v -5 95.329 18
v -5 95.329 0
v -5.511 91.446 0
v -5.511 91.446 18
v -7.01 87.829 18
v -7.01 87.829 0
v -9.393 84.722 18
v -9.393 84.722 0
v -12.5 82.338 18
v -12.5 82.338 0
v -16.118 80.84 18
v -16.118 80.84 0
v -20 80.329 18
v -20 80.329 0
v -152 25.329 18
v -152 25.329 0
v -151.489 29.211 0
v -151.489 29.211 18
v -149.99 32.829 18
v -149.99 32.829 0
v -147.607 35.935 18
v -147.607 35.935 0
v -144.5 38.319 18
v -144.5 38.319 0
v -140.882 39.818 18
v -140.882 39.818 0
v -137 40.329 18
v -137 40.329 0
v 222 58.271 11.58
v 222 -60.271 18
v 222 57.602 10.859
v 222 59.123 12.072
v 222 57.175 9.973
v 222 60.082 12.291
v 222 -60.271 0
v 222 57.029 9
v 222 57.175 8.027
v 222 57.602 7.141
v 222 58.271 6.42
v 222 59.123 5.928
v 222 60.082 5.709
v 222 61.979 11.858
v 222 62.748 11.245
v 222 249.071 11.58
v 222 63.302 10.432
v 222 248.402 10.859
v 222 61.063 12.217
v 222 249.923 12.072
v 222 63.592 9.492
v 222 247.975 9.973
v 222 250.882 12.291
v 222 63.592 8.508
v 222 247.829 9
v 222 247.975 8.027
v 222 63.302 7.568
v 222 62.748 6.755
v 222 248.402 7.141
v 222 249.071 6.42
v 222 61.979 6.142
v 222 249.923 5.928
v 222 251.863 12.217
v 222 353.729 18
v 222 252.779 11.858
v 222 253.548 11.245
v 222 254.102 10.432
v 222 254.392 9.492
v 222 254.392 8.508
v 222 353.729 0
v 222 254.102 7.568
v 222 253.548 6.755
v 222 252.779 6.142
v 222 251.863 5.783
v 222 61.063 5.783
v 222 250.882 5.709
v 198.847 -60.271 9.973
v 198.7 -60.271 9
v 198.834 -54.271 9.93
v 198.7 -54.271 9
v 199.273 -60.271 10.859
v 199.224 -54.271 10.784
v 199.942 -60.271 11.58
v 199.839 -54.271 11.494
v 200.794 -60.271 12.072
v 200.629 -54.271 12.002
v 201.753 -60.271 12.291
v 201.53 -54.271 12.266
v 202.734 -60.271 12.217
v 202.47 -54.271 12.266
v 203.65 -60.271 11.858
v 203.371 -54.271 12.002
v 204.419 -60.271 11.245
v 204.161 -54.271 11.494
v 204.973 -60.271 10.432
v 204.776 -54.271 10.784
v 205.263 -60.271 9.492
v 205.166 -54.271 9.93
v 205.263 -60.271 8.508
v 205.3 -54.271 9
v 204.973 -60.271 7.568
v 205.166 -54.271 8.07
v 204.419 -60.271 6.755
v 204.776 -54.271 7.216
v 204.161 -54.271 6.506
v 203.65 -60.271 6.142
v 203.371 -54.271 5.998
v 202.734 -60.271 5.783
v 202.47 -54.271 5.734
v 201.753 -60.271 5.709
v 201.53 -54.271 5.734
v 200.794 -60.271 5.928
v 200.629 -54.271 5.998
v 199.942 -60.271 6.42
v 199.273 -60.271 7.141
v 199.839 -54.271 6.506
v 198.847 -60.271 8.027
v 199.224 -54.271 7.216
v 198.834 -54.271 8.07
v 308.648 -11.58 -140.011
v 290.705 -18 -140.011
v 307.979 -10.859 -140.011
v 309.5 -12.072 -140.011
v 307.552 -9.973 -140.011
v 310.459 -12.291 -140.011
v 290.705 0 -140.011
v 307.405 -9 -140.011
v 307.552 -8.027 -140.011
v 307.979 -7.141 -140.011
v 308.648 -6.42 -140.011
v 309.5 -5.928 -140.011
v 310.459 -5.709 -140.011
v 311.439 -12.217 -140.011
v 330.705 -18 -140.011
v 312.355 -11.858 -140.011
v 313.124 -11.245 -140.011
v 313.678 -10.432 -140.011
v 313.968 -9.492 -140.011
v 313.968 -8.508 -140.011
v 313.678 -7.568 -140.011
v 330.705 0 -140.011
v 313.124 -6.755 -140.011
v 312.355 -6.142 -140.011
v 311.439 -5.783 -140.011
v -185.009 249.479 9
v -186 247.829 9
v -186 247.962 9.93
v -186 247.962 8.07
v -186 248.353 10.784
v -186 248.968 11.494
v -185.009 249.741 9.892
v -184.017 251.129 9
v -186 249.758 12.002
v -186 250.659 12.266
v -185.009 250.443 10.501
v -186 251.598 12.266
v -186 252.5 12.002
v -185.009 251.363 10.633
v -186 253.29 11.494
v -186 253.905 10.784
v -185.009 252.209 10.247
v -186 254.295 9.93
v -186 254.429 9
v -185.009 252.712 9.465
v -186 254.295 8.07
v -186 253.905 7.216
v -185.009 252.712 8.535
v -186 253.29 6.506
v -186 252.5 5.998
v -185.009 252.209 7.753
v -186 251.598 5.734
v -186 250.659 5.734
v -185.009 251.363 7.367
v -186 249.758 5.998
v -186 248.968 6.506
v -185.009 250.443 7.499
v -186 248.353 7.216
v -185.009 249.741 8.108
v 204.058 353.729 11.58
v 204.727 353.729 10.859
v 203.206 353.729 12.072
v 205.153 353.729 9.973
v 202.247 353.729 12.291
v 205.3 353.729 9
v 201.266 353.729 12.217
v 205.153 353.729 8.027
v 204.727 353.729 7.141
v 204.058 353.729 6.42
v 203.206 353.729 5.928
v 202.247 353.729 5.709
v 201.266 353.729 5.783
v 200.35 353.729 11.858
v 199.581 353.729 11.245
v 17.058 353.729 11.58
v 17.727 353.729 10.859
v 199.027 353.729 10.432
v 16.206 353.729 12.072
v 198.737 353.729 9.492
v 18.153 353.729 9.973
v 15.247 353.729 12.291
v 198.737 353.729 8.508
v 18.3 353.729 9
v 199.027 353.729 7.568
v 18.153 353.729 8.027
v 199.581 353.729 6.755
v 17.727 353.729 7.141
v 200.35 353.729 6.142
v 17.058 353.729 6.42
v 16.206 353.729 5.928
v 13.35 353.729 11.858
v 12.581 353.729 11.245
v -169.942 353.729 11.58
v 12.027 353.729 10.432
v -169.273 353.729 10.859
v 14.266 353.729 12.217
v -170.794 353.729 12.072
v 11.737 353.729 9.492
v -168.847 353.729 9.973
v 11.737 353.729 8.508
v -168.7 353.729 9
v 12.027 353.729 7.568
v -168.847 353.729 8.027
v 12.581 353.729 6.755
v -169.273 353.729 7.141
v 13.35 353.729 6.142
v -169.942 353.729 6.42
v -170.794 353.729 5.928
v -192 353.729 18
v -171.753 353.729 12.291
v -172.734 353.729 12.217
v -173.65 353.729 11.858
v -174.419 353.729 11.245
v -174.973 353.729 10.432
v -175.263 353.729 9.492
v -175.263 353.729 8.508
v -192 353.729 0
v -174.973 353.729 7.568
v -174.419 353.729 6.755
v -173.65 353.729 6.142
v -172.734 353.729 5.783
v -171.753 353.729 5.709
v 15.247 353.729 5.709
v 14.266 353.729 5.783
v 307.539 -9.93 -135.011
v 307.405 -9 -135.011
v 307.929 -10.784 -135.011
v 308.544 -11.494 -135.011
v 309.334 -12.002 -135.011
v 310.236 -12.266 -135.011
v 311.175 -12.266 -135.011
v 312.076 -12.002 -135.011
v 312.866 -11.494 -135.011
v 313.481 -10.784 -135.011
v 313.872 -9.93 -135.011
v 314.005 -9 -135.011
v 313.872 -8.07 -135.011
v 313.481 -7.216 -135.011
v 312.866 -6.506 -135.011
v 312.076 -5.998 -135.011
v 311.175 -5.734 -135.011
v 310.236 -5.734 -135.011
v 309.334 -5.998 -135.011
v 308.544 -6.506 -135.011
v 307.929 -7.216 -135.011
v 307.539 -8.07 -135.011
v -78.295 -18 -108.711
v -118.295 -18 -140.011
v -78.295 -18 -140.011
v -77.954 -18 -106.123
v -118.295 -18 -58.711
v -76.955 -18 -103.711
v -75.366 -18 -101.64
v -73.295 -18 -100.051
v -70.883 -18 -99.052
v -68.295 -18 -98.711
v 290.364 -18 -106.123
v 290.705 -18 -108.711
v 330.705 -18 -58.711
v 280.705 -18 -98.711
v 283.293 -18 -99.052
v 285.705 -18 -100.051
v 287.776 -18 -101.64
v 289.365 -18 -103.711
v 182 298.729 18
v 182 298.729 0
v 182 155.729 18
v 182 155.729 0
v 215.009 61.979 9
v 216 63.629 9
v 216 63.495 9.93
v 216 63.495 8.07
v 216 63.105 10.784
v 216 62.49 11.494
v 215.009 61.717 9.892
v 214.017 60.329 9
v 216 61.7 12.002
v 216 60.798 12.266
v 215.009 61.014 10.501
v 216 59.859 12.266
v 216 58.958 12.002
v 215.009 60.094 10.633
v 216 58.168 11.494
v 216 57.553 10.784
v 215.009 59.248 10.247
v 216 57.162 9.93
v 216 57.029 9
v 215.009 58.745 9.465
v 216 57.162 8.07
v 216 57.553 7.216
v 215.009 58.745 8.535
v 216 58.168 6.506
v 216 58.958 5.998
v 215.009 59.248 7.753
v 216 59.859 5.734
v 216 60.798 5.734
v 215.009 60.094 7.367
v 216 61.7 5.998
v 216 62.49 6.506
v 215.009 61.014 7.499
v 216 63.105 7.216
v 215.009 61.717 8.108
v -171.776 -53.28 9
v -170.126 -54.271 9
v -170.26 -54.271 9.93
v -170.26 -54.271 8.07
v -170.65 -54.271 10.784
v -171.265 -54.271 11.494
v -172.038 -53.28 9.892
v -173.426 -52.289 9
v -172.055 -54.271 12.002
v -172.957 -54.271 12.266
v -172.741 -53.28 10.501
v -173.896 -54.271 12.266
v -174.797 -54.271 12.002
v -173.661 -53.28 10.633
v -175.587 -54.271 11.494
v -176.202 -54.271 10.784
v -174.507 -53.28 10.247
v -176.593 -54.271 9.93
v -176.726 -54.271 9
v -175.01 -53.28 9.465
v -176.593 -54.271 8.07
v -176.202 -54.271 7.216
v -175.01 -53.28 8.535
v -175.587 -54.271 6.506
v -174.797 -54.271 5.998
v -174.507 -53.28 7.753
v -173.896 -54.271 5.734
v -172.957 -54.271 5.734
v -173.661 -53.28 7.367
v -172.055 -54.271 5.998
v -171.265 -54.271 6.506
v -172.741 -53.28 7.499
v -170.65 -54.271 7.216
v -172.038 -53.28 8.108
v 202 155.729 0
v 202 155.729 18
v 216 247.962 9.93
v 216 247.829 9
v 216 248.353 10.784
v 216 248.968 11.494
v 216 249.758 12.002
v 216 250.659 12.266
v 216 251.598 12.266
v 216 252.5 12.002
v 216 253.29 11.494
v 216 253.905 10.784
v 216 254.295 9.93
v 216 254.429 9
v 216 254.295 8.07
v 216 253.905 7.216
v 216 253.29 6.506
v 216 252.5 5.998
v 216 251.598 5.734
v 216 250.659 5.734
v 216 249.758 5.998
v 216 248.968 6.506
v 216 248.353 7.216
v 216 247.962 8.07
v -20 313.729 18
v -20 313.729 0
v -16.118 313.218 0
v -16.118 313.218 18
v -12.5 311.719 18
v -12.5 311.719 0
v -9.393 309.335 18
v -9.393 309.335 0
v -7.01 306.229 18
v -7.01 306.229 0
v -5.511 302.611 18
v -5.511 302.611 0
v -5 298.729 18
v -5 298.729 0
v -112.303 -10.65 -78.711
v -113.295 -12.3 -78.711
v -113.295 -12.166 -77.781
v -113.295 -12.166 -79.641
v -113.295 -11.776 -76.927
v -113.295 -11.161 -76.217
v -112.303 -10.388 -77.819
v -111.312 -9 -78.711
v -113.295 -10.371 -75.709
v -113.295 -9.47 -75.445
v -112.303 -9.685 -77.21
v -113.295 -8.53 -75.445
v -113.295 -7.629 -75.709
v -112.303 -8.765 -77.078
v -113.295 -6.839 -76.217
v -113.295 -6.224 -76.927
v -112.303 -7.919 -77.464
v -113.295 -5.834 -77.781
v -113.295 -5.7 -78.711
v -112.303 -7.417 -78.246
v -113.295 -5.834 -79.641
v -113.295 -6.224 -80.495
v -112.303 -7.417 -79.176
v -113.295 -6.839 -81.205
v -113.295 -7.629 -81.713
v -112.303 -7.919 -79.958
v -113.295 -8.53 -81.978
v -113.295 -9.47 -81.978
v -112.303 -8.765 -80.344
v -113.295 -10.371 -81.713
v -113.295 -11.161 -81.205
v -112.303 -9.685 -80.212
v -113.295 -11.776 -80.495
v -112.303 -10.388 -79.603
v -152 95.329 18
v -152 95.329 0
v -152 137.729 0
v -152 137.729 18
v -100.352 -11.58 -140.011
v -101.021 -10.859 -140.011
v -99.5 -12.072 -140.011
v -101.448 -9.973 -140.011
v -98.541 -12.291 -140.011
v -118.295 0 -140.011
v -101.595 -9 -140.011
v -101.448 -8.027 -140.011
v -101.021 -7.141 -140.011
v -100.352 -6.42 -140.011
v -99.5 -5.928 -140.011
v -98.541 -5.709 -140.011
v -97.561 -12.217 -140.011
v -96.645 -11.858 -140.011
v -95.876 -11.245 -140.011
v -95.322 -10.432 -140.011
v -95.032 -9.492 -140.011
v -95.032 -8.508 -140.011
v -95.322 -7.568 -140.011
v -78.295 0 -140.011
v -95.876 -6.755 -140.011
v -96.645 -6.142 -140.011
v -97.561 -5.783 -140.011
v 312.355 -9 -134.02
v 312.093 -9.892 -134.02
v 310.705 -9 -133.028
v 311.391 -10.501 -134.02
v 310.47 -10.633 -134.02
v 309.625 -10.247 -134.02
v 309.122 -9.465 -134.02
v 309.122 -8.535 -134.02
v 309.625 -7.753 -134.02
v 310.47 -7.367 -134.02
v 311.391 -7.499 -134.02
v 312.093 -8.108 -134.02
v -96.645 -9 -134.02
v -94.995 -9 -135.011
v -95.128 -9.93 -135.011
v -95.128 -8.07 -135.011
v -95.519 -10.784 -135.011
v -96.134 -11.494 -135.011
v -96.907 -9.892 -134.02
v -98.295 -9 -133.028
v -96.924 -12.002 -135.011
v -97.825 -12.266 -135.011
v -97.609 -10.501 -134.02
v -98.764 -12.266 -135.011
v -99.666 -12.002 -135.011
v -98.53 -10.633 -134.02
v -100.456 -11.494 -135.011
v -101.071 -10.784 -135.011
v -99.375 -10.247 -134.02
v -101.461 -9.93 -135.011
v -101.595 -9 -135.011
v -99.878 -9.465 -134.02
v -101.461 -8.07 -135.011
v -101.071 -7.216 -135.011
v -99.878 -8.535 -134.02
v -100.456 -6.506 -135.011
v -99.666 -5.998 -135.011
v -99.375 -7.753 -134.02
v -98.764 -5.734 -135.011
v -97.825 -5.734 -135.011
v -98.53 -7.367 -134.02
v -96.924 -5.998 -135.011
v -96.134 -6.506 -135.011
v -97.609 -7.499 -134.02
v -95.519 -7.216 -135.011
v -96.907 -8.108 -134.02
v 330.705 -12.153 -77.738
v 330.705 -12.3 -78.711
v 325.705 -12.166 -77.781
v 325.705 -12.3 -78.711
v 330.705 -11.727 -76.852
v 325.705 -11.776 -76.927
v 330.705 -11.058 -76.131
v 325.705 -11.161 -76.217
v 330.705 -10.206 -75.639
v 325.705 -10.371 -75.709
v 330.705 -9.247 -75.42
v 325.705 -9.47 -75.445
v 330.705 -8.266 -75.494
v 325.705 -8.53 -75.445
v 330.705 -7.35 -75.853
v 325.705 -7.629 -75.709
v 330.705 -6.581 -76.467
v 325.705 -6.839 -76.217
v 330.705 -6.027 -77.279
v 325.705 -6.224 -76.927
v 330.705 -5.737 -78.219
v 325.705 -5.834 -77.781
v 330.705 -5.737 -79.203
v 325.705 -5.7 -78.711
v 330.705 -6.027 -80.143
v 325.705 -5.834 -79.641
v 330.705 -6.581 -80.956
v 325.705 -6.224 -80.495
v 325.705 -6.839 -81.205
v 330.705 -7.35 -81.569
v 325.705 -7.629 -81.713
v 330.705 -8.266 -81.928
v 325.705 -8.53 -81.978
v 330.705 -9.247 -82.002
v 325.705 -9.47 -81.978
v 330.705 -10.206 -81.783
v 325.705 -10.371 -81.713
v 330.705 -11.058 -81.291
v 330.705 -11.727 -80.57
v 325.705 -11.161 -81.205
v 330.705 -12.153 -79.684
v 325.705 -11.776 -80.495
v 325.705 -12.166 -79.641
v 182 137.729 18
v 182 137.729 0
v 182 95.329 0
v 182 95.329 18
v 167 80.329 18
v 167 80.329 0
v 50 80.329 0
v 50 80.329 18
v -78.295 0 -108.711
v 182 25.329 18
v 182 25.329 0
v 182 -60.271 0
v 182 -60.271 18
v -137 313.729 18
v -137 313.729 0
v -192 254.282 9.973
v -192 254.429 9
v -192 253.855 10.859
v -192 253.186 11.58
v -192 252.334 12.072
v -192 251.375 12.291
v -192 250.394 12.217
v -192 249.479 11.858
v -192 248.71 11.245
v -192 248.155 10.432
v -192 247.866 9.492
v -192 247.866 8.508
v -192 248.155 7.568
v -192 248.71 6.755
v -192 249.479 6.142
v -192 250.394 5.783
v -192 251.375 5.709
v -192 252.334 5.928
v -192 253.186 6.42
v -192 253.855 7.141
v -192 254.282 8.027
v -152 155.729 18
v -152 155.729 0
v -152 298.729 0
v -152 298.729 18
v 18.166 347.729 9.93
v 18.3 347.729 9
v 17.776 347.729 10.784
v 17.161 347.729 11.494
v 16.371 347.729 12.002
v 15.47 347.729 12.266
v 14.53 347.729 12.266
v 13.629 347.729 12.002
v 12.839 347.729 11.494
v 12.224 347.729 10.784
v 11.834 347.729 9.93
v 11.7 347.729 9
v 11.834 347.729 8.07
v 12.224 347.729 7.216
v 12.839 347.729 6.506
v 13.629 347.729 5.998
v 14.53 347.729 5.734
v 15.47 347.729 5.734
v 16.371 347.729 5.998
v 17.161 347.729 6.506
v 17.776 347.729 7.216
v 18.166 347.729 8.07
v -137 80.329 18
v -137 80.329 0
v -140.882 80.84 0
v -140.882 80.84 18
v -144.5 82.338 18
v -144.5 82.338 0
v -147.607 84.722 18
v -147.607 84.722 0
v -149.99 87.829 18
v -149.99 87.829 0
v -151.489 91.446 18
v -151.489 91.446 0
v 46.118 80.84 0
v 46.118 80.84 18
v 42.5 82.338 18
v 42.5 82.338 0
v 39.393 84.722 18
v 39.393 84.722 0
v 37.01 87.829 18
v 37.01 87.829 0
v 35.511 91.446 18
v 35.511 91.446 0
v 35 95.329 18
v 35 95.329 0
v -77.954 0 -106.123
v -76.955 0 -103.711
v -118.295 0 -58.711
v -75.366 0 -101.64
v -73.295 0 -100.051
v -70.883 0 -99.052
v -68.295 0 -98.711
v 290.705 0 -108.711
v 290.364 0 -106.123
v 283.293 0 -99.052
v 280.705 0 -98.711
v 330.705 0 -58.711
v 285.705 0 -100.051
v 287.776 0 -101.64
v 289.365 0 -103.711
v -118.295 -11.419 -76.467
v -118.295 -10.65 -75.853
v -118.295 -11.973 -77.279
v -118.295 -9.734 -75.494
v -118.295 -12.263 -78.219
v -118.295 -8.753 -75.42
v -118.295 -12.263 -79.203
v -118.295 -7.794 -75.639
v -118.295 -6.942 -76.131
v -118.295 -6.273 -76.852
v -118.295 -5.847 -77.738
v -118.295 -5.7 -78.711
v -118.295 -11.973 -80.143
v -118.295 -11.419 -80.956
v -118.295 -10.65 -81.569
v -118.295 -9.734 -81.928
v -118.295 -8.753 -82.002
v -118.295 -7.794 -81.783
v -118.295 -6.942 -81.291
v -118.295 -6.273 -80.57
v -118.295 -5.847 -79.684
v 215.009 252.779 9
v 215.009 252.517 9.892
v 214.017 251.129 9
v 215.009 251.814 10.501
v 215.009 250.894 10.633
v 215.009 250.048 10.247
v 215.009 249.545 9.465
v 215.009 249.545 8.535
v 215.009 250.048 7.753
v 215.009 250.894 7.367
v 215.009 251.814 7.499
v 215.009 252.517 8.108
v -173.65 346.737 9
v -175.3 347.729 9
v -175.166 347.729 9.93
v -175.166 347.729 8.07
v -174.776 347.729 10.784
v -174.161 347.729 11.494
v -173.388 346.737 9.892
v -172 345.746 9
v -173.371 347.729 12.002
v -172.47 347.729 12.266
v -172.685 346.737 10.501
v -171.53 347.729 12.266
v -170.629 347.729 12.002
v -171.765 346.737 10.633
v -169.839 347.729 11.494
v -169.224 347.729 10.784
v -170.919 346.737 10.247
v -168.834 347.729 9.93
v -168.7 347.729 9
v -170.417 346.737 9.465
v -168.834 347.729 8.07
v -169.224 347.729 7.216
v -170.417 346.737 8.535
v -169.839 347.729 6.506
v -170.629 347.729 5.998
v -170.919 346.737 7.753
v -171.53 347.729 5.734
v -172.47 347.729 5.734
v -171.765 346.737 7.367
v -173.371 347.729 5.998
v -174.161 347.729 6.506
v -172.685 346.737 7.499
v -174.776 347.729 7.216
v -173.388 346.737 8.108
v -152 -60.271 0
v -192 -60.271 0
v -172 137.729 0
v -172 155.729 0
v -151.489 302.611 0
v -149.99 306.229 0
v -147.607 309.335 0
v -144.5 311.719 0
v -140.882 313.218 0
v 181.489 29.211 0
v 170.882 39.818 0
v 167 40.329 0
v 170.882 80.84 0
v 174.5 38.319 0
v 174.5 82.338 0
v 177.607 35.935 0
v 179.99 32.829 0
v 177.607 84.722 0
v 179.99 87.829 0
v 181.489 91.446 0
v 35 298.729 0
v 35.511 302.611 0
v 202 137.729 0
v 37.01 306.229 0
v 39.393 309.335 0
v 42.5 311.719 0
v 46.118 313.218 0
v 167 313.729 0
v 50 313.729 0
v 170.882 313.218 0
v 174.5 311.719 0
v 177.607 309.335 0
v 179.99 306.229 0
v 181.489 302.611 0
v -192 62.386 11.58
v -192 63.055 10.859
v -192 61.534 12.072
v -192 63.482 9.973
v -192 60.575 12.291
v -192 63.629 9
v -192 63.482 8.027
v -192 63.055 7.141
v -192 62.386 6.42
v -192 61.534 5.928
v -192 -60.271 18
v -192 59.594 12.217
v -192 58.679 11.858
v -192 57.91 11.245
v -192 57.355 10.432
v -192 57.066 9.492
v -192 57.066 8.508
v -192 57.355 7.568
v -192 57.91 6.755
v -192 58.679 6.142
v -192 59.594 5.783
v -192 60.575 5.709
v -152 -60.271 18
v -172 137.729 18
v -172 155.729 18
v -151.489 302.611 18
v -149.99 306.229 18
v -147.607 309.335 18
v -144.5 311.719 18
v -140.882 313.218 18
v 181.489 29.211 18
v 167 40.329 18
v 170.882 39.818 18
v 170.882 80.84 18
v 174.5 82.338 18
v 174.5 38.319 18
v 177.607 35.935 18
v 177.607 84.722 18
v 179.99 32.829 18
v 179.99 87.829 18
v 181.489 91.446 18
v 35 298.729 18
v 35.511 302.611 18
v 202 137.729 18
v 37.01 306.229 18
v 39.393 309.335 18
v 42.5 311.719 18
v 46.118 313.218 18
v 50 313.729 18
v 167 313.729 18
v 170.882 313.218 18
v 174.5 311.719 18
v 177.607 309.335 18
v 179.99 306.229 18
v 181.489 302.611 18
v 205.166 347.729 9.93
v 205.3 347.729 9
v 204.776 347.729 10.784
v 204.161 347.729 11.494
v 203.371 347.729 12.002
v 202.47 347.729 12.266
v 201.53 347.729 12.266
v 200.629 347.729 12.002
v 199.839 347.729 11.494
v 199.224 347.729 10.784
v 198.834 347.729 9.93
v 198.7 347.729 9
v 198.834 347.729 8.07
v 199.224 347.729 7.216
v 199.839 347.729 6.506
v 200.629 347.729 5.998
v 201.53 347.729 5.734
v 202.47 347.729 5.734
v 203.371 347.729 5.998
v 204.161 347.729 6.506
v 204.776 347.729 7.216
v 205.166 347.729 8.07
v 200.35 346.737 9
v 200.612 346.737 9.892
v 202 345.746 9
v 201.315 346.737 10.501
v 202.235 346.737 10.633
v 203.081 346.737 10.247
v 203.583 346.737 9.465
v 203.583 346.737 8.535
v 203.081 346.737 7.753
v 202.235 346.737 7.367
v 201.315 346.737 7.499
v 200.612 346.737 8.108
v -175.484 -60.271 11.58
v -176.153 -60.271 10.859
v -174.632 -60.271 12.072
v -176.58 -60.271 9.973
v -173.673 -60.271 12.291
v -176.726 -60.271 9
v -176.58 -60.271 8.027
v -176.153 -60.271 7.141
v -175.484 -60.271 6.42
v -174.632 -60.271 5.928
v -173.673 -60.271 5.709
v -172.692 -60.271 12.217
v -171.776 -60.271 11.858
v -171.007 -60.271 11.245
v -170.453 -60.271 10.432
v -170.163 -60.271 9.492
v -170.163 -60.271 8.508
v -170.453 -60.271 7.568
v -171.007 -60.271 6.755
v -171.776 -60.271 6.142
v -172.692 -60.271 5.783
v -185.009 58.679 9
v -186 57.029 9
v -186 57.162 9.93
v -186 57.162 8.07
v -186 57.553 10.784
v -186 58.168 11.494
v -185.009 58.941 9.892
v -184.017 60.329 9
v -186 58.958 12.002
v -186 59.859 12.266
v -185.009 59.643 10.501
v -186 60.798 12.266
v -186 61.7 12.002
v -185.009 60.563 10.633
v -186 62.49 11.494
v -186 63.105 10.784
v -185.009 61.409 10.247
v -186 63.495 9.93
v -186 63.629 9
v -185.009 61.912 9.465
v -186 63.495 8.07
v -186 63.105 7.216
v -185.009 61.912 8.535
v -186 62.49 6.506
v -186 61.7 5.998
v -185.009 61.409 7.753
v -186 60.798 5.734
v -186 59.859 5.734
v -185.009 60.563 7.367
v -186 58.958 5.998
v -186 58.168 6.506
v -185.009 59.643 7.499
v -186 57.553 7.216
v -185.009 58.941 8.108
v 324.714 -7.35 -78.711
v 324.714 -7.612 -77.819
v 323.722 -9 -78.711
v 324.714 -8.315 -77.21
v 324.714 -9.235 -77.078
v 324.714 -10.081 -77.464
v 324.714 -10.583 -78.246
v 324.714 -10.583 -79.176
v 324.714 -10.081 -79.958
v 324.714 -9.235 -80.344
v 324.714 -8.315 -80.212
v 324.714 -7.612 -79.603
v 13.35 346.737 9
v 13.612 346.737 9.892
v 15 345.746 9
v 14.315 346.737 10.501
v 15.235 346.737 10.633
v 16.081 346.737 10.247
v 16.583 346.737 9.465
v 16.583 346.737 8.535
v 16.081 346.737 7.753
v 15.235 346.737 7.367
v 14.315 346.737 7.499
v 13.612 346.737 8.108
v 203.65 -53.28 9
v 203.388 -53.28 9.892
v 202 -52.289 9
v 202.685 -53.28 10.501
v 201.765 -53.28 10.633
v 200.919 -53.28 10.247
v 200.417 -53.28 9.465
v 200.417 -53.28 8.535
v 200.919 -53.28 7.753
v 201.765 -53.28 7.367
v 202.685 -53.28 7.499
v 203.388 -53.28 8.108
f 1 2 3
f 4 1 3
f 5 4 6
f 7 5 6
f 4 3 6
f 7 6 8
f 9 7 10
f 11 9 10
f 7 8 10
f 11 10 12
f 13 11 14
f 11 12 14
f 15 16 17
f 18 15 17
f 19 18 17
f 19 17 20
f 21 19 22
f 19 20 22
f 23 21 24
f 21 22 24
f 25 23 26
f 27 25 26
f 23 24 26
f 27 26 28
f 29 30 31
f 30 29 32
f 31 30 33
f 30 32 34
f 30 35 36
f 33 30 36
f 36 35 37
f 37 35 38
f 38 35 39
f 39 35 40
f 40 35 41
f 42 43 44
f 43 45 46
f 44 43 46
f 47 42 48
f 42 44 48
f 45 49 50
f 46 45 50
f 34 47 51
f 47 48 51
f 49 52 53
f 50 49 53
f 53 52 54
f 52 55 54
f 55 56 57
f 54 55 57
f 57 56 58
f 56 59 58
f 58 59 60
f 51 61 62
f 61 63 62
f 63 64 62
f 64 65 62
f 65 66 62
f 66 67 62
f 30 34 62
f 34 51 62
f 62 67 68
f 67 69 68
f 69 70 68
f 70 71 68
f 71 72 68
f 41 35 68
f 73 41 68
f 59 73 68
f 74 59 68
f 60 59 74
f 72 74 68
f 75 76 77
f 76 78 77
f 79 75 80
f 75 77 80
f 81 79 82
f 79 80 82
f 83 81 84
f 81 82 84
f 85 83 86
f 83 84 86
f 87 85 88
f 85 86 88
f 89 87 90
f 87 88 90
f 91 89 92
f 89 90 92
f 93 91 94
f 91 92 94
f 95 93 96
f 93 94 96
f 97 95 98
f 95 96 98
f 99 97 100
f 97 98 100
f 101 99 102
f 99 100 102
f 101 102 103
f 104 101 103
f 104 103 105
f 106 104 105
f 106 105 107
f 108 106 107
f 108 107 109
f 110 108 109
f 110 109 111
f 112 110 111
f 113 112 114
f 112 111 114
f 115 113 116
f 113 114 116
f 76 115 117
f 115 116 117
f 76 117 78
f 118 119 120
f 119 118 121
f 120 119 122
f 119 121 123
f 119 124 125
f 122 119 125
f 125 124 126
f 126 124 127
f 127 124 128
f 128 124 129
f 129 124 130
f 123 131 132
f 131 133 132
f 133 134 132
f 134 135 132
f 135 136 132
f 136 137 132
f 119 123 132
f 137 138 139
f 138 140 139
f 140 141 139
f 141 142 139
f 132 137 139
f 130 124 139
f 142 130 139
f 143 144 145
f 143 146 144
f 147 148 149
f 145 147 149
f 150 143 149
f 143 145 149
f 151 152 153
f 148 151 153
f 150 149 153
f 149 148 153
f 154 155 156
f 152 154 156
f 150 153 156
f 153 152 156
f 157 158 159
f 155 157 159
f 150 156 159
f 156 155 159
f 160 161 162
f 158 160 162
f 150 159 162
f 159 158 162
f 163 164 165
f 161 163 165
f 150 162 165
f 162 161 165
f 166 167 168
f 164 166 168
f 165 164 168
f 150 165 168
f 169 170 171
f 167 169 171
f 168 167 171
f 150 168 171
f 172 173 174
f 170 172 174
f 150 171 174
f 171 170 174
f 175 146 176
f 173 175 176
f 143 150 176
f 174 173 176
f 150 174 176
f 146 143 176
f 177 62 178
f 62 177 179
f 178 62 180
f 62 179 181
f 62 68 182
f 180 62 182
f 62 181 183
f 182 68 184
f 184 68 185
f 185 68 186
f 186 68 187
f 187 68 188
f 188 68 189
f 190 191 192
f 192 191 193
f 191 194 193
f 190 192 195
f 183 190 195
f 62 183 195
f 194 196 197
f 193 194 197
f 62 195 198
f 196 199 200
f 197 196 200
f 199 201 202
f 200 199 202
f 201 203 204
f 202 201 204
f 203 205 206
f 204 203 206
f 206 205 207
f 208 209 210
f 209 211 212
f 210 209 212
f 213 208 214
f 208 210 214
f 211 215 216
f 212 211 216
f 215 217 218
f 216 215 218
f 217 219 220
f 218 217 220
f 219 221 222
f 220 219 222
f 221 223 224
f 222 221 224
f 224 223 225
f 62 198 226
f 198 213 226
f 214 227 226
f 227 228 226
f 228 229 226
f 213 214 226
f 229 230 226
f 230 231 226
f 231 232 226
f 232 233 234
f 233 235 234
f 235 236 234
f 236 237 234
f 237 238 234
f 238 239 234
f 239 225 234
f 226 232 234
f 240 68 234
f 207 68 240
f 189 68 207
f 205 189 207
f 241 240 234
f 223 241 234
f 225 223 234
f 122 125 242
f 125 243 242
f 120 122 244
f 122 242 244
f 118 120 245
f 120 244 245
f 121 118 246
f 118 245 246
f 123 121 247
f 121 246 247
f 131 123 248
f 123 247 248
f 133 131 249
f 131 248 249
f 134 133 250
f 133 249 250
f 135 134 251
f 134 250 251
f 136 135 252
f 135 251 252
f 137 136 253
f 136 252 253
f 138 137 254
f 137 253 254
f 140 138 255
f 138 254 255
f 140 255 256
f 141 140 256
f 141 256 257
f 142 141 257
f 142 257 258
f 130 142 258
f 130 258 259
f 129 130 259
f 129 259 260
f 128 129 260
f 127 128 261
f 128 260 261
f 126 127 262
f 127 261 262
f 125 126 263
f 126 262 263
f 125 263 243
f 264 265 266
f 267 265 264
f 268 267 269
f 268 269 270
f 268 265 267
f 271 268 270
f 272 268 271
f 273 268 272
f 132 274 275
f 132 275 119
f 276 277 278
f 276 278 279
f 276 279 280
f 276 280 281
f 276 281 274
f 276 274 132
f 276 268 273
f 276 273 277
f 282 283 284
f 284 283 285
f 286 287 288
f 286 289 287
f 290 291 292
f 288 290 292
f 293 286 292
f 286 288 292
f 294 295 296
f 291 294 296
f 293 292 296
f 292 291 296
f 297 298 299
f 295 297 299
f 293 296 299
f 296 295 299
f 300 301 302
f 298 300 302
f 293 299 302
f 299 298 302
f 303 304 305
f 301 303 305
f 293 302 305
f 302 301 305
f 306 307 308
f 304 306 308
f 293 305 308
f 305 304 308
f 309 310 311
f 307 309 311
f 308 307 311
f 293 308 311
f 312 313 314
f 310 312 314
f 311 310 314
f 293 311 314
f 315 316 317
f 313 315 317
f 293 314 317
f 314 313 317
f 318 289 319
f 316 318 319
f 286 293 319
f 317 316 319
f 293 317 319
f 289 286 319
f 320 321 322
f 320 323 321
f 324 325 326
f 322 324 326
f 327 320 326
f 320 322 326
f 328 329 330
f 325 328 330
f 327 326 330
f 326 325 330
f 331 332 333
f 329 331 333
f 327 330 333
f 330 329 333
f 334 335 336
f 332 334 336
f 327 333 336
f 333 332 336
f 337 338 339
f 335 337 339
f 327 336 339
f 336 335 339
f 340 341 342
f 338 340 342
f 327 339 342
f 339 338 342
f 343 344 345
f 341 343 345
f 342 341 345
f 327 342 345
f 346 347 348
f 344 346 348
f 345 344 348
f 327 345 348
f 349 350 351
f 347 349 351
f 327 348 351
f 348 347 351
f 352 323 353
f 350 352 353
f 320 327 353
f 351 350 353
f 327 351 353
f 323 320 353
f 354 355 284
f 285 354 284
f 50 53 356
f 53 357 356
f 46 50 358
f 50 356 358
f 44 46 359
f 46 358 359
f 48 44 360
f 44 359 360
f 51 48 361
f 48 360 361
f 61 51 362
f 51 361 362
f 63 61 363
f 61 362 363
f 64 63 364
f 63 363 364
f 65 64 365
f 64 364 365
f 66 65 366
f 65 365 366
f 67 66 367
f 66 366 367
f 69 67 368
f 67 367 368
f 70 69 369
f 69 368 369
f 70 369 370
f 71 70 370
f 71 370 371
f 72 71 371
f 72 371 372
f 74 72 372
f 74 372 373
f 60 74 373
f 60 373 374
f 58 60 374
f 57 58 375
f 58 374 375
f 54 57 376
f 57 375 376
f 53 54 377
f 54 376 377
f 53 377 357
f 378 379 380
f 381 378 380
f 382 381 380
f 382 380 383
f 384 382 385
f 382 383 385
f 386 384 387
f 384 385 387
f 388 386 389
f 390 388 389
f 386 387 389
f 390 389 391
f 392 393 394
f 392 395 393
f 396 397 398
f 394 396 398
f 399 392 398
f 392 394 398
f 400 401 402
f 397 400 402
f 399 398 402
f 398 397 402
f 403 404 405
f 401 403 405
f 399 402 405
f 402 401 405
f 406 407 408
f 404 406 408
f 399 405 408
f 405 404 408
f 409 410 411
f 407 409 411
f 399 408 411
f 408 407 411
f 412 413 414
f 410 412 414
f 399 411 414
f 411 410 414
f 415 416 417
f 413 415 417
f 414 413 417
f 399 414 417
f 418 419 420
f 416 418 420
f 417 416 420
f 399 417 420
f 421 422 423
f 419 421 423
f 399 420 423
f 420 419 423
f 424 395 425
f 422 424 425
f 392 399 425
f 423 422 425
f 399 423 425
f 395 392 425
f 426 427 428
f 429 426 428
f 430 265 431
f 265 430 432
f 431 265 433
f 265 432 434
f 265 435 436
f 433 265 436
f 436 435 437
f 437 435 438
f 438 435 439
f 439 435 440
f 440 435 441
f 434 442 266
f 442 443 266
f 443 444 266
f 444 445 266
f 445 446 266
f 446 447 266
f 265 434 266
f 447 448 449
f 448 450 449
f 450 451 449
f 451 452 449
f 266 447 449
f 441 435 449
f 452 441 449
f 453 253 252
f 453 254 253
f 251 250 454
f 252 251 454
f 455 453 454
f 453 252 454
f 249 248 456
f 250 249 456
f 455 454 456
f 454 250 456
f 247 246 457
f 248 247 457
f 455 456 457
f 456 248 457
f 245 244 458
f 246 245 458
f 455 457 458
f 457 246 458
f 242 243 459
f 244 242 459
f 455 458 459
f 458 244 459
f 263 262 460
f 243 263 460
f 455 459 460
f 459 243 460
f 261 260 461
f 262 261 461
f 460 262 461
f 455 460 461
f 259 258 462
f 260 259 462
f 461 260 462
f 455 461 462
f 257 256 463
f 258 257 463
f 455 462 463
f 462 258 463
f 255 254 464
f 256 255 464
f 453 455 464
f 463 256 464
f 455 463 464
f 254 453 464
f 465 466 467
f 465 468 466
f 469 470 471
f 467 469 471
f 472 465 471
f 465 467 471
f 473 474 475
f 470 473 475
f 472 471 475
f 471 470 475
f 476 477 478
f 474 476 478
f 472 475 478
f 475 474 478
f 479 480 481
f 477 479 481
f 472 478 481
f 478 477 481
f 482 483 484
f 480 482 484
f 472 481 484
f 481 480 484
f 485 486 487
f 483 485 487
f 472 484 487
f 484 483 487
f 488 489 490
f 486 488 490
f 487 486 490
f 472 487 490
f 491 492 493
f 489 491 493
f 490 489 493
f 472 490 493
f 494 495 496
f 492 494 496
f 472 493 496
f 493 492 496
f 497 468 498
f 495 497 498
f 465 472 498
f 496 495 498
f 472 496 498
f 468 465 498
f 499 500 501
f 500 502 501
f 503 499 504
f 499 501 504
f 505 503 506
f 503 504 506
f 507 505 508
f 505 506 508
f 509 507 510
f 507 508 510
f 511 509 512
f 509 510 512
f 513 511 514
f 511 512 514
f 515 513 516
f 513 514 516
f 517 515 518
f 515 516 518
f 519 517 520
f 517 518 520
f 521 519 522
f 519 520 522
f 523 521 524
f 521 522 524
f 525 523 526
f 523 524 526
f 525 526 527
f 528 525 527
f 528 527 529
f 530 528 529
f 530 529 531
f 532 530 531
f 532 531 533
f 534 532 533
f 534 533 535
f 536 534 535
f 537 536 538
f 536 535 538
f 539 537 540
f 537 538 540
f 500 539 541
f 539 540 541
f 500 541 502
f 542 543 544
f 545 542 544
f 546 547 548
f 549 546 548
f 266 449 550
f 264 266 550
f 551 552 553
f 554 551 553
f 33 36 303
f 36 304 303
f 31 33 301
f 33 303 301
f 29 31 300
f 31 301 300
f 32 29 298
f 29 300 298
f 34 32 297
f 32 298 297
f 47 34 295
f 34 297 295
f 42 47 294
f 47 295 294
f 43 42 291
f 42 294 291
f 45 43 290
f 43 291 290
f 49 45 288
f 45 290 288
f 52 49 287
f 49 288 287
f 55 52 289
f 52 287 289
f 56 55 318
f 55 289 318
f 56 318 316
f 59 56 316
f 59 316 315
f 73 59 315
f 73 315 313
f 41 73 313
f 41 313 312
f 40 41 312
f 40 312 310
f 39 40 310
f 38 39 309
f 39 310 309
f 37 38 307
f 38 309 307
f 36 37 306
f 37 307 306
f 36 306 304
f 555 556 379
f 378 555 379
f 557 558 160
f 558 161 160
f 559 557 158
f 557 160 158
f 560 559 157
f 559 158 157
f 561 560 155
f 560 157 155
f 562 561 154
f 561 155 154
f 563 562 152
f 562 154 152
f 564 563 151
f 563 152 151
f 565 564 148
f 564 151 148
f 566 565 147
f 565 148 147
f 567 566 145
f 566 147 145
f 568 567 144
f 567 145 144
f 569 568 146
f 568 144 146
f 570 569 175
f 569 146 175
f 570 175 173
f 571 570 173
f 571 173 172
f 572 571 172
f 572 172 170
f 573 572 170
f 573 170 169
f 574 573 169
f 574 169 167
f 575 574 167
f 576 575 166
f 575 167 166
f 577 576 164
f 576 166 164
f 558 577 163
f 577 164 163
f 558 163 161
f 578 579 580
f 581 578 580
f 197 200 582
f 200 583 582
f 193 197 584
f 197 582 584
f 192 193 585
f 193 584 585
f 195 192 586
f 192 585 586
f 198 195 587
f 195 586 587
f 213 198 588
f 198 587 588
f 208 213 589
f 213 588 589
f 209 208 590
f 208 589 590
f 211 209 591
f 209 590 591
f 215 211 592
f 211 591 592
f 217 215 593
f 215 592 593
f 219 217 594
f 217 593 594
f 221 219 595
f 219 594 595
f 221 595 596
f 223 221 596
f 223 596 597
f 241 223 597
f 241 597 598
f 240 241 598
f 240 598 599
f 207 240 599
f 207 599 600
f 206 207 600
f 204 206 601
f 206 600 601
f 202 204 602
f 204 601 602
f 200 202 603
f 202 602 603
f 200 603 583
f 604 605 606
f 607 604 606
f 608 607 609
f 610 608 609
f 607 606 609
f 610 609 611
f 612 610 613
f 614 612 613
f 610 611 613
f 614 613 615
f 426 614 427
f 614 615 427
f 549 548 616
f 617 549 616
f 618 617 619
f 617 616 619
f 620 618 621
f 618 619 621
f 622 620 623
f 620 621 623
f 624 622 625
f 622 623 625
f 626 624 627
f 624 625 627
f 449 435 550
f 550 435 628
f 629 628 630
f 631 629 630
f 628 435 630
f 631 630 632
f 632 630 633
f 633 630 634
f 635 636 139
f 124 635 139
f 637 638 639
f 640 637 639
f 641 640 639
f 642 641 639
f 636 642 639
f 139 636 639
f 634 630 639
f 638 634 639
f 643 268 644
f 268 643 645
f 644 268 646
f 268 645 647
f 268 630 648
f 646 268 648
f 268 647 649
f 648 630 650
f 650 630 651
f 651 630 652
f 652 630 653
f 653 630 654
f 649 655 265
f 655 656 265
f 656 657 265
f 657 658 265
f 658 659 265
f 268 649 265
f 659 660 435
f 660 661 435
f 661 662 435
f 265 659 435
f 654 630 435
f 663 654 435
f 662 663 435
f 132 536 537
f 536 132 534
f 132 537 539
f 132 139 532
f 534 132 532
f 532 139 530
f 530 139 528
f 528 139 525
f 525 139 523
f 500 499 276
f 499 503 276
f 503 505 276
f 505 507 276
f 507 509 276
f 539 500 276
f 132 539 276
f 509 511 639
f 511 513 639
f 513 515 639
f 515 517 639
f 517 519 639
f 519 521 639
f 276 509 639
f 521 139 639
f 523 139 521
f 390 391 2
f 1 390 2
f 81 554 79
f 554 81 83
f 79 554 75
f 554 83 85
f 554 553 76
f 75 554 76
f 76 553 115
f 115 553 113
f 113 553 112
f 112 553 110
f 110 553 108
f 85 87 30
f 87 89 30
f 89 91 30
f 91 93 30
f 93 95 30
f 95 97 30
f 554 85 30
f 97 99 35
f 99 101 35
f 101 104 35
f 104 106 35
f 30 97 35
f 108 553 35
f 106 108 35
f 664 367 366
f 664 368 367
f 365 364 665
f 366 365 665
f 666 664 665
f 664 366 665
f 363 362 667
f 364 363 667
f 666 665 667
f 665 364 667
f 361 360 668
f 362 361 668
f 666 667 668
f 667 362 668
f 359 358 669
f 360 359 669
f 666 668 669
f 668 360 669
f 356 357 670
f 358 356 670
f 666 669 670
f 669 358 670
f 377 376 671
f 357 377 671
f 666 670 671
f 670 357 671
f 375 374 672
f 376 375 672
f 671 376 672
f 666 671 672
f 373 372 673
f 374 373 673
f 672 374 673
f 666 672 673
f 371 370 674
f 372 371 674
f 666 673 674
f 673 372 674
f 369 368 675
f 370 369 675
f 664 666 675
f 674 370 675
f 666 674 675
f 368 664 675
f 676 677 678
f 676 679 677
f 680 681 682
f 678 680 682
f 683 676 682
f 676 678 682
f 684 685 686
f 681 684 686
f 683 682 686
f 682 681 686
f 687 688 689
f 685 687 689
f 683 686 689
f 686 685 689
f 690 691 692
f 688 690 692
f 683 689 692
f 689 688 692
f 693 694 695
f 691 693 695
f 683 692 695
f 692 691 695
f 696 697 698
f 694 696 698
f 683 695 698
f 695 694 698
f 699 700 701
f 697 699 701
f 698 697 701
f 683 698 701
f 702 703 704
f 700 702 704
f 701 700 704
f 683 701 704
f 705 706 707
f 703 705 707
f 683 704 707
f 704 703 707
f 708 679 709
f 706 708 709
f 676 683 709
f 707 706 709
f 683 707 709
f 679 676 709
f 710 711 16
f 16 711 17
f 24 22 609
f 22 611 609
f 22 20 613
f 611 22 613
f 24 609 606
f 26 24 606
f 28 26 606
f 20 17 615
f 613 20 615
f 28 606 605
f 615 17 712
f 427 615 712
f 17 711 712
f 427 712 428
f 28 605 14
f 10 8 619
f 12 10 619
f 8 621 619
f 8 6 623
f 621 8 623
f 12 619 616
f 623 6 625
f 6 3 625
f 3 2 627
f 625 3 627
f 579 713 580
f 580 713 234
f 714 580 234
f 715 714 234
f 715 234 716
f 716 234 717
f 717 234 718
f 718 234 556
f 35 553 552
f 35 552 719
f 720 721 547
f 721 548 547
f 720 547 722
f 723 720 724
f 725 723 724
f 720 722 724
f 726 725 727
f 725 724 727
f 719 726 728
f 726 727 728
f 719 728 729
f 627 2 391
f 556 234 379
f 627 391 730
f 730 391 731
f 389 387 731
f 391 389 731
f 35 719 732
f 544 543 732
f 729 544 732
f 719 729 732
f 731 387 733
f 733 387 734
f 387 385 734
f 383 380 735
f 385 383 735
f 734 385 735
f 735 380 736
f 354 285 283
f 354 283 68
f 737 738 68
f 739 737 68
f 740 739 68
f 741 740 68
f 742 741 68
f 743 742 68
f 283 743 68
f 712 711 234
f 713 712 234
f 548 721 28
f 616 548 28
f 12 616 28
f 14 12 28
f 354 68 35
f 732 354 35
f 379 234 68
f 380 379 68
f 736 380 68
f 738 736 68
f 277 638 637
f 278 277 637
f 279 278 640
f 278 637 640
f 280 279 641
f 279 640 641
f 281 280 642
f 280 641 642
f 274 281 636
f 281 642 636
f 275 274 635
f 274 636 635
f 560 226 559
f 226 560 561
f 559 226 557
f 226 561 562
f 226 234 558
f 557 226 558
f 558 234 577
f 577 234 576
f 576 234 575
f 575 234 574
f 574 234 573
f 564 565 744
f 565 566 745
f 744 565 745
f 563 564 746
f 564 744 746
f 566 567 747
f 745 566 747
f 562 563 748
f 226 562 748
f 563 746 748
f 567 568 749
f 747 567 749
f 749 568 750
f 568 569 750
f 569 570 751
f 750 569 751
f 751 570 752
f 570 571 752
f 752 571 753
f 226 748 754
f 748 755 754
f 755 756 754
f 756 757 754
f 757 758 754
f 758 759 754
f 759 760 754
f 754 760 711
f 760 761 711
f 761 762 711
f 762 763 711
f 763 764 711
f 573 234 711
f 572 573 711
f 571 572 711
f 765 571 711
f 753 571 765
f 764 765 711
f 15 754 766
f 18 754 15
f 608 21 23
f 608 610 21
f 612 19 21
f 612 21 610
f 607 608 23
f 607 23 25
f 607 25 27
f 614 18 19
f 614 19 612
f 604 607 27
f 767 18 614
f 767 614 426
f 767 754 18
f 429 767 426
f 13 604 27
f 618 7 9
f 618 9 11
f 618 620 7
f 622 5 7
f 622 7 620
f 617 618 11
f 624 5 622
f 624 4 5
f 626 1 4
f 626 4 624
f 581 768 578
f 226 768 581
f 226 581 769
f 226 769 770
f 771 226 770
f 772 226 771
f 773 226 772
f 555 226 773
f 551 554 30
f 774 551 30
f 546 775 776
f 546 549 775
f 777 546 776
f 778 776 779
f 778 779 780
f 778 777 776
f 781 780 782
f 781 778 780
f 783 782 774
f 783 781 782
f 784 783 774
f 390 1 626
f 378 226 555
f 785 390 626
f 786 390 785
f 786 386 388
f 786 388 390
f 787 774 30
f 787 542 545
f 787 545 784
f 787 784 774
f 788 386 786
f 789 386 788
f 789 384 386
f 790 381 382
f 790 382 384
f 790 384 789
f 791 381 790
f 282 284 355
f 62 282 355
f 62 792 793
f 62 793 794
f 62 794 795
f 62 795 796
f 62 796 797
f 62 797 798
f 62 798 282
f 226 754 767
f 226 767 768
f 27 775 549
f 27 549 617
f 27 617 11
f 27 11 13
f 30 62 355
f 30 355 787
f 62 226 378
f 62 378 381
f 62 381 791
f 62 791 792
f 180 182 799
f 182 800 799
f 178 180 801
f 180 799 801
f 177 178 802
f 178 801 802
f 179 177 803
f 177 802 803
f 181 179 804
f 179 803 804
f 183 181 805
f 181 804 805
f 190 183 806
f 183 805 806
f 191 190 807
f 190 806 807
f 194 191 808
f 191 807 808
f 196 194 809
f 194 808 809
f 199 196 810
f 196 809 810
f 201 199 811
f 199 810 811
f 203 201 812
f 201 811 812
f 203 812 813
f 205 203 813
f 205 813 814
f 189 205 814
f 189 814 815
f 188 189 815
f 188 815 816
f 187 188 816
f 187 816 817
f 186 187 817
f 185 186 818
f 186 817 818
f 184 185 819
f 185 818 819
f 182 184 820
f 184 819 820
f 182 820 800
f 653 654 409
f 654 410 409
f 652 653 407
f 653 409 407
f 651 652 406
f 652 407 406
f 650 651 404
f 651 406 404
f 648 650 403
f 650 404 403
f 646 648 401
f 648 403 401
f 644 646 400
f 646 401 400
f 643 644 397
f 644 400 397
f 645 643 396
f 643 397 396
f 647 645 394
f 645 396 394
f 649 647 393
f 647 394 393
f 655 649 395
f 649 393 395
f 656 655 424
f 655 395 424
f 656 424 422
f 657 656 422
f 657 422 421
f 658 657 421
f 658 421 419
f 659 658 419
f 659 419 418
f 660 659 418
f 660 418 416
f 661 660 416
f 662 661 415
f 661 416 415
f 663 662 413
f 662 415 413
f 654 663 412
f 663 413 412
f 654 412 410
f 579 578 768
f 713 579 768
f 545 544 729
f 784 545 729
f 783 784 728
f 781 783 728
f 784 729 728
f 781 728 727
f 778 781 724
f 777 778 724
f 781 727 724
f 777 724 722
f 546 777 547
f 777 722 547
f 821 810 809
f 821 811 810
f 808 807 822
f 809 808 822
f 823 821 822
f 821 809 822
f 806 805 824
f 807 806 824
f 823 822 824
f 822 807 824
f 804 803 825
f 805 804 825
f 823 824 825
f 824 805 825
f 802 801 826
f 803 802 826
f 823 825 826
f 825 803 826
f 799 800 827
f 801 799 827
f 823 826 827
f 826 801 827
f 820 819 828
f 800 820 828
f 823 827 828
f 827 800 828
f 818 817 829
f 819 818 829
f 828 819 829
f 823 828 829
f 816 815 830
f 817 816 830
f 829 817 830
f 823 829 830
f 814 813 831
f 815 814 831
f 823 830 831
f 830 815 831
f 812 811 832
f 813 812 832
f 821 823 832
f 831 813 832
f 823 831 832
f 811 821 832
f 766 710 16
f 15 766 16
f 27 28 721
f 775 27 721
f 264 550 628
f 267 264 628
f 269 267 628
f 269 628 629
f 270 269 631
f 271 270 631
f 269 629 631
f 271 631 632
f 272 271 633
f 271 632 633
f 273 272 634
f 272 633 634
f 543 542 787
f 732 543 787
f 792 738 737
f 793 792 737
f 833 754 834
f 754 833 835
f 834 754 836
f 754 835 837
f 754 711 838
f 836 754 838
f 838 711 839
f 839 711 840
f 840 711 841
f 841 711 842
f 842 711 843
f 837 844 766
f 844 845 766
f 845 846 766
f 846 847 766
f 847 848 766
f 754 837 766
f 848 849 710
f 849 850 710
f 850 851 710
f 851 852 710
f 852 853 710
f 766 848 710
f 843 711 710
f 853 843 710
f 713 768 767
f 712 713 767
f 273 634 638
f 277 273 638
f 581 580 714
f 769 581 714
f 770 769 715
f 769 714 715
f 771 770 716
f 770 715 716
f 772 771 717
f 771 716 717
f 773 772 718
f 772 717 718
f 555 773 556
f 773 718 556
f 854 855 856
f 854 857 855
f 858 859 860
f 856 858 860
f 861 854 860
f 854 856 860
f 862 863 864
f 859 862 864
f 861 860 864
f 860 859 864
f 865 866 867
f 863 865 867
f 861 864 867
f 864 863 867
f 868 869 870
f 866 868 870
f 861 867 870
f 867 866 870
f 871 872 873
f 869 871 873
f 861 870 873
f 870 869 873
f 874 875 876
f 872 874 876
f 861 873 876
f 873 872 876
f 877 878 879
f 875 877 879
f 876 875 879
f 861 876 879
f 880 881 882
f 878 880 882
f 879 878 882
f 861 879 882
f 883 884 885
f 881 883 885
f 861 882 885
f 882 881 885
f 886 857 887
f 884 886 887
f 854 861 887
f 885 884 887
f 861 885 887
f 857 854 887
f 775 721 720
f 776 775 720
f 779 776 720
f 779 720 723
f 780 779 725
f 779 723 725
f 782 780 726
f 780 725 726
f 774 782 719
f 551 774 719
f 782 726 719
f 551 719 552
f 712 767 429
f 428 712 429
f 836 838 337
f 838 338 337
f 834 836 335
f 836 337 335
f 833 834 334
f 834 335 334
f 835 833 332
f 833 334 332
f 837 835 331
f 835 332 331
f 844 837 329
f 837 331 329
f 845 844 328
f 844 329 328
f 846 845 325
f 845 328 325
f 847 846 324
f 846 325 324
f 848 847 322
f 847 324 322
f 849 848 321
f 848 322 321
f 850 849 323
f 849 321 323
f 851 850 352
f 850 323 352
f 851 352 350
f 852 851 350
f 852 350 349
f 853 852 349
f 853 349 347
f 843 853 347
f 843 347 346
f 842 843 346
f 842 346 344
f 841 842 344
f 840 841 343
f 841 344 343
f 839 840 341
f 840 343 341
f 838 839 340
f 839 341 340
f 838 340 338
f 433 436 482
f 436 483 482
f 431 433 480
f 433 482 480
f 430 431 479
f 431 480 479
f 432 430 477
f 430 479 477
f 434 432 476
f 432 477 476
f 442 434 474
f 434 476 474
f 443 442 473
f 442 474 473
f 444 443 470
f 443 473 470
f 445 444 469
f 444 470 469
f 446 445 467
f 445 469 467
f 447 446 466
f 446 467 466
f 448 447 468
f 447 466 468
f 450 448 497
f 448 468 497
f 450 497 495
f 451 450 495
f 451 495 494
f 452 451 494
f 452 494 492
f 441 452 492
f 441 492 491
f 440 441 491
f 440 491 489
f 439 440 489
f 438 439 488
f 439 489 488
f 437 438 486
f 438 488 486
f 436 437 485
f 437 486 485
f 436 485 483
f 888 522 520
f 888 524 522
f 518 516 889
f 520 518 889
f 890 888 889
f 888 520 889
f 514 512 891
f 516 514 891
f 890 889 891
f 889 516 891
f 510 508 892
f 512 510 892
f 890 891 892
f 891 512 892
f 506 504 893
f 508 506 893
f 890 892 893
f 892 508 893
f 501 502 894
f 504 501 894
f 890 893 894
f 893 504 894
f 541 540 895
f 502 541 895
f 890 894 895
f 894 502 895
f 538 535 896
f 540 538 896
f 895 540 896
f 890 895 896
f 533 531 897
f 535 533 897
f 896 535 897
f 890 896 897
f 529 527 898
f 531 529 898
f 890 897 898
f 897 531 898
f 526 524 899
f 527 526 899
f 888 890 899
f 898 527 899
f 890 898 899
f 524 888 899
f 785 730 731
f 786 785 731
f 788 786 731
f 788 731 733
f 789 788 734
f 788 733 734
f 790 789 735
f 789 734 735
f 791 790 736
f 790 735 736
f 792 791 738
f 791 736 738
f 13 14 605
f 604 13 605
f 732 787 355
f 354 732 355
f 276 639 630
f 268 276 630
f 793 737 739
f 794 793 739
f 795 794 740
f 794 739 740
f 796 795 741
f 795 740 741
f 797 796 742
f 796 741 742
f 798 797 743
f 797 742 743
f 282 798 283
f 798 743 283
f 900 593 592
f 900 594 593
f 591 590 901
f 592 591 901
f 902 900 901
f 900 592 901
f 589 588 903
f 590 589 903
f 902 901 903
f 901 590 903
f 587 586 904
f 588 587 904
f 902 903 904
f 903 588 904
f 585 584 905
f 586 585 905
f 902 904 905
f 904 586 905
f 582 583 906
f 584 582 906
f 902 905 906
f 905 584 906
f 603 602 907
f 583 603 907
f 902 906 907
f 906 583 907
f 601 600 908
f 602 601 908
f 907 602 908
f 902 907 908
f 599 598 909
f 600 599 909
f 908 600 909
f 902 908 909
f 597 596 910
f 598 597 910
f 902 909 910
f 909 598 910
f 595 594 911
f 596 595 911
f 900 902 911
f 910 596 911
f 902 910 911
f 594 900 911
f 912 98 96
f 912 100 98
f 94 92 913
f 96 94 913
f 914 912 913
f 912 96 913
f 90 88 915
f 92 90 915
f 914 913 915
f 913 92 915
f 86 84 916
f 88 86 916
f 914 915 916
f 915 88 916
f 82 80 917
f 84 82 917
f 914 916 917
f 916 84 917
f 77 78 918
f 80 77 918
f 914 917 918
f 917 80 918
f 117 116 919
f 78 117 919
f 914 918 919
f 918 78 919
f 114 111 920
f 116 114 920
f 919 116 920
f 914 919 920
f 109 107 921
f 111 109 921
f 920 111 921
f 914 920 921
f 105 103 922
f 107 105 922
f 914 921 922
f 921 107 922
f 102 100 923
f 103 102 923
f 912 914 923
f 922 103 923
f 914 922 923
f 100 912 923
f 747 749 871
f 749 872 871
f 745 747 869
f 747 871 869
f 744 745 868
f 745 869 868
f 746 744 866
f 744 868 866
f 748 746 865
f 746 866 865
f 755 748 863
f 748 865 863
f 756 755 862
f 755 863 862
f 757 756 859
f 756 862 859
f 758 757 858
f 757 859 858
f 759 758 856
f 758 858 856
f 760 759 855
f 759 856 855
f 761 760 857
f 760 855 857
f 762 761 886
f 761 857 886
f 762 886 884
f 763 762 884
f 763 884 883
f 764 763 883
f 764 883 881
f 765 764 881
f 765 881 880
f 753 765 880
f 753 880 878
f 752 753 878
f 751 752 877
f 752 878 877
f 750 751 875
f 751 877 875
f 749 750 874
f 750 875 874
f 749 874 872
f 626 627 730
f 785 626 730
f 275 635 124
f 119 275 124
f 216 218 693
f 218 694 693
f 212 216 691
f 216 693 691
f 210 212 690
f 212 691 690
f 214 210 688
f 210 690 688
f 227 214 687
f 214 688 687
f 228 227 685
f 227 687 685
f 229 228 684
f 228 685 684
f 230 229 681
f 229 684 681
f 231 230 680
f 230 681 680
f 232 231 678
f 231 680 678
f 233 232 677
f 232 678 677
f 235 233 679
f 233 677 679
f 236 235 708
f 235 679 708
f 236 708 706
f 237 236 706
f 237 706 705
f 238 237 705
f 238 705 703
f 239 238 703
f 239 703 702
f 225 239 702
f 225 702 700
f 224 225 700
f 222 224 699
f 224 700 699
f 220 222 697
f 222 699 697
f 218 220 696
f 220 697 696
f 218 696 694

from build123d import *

# Parameters (mm, degrees)
F1_DEPTH         = 18
F6_D             = 6.6
F6_DEPTH         = 6
F6_TIP           = 1.9828400428
F6_ON_F5_D       = 6.6
F6_ON_F5_DEPTH   = 6
F6_ON_F5_TIP     = 1.9828400428
F6_ON_F2_D       = 6.6
F6_ON_F2_DEPTH   = 6
F6_ON_F2_TIP     = 1.9828400428
F6_ON_F4_D       = 6.6
F6_ON_F4_DEPTH   = 6
F6_ON_F4_TIP     = 1.9828400428
F7_ANGLE         = 90
F8_ANGLE         = -90
F10_DEPTH        = 18
F12_DEPTH        = 18
F17_D            = 6.6
F17_DEPTH        = 5
F17_TIP          = 1.9828400428
F17_ON_F15_D     = 6.6
F17_ON_F15_DEPTH = 5
F17_ON_F15_TIP   = 1.9828400428
F17_ON_F16_D     = 6.6
F17_ON_F16_DEPTH = 5
F17_ON_F16_TIP   = 1.9828400428
F17_ON_F14_D     = 6.6
F17_ON_F14_DEPTH = 5
F17_ON_F14_TIP   = 1.9828400428


with BuildPart() as f1:
    # F0 (on Top) → F1 (new body)
    with BuildSketch(Plane.XY):
        with BuildLine():
            Line((15, 353.7286525786), (-192, 353.7286525786))
            Line((-192, 353.7286525786), (-192, -60.2713474214))
            Line((-192, -60.2713474214), (-152, -60.2713474214))
            Line((-152, -60.2713474214), (-152, 25.3286525786))
            ThreePointArc((-152, 25.3286525786), (-147.6066017178, 35.9352542964), (-137, 40.3286525786))
            Line((-137, 40.3286525786), (15, 40.3286525786))
            Line((15, 40.3286525786), (15, 353.7286525786))
        make_face()
        with BuildLine():
            ThreePointArc((-20, 313.7286525786), (-9.3933982822, 309.3352542964), (-5, 298.7286525786))
            Line((-5, 298.7286525786), (-5, 95.3286525786))
            ThreePointArc((-5, 95.3286525786), (-9.3933982822, 84.7220508608), (-20, 80.3286525786))
            Line((-20, 80.3286525786), (-137, 80.3286525786))
            ThreePointArc((-137, 80.3286525786), (-147.6066017178, 84.7220508608), (-152, 95.3286525786))
            Line((-152, 95.3286525786), (-152, 298.7286525786))
            ThreePointArc((-152, 298.7286525786), (-147.6066017178, 309.3352542964), (-137, 313.7286525786))
            Line((-137, 313.7286525786), (-20, 313.7286525786))
        make_face(mode=Mode.SUBTRACT)
        with BuildLine():
            Line((222, 353.7286525786), (15, 353.7286525786))
            Line((15, 353.7286525786), (15, 40.3286525786))
            Line((15, 40.3286525786), (167, 40.3286525786))
            ThreePointArc((167, 40.3286525786), (177.6066017178, 35.9352542964), (182, 25.3286525786))
            Line((182, 25.3286525786), (182, -60.2713474214))
            Line((182, -60.2713474214), (222, -60.2713474214))
            Line((222, -60.2713474214), (222, 353.7286525786))
        make_face()
        with BuildLine():
            ThreePointArc((35, 298.7286525786), (39.3933982822, 309.3352542964), (50, 313.7286525786))
            Line((50, 313.7286525786), (167, 313.7286525786))
            ThreePointArc((167, 313.7286525786), (177.6066017178, 309.3352542964), (182, 298.7286525786))
            Line((182, 298.7286525786), (182, 95.3286525786))
            ThreePointArc((182, 95.3286525786), (177.6066017178, 84.7220508608), (167, 80.3286525786))
            Line((167, 80.3286525786), (50, 80.3286525786))
            ThreePointArc((50, 80.3286525786), (39.3933982822, 84.7220508608), (35, 95.3286525786))
            Line((35, 95.3286525786), (35, 298.7286525786))
        make_face(mode=Mode.SUBTRACT)
    extrude(amount=F1_DEPTH)

    # F6
    with Locations(Plane.XZ.offset(60.2713474214)):
        with Locations((202, 9), (-173.4263598919, 9)):
            Hole(F6_D / 2, depth=F6_DEPTH)
            with Locations((0, 0, -(F6_DEPTH + F6_TIP / 2))):  # 118° drill point
                Cone(0, F6_D / 2, F6_TIP, mode=Mode.SUBTRACT)

    # F6 on F5
    with Locations(Plane(origin=(-192, 0, 0), x_dir=(0, -1, 0), z_dir=(-1, 0, 0))):
        with Locations((-60.3286525786, 9), (-251.1286525786, 9)):
            Hole(F6_ON_F5_D / 2, depth=F6_ON_F5_DEPTH)
            with Locations((0, 0, -(F6_ON_F5_DEPTH + F6_ON_F5_TIP / 2))):  # 118° drill point
                Cone(0, F6_ON_F5_D / 2, F6_ON_F5_TIP, mode=Mode.SUBTRACT)

    # F6 on F2
    with Locations(Plane(origin=(0, 353.7286525786, 0), x_dir=(-1, 0, 0), z_dir=(0, 1, 0))):
        with Locations((172, 9), (-15, 9), (-202, 9)):
            Hole(F6_ON_F2_D / 2, depth=F6_ON_F2_DEPTH)
            with Locations((0, 0, -(F6_ON_F2_DEPTH + F6_ON_F2_TIP / 2))):  # 118° drill point
                Cone(0, F6_ON_F2_D / 2, F6_ON_F2_TIP, mode=Mode.SUBTRACT)

    # F6 on F4
    with Locations(Plane.YZ.offset(222)):
        with Locations((60.3286525786, 9), (251.1286525786, 9)):
            Hole(F6_ON_F4_D / 2, depth=F6_ON_F4_DEPTH)
            with Locations((0, 0, -(F6_ON_F4_DEPTH + F6_ON_F4_TIP / 2))):  # 118° drill point
                Cone(0, F6_ON_F4_D / 2, F6_ON_F4_TIP, mode=Mode.SUBTRACT)


with BuildPart() as f1_1:
    # F7: moved
    add(f1.part.rotate(Axis((15, 353.7286525786, 18), (1, 0, 0)), F7_ANGLE))


with BuildPart() as f1_2:
    # F8: moved
    add(f1_1.part.rotate(Axis((15, 353.7286525786, 18), (1, 0, 0)), F8_ANGLE))

    # F9 (on face) → F10 (cut)
    with BuildSketch(Plane.XY.offset(18)):
        Polygon((-172, 155.7286525786), (-172, 146.7286525786), (-172, 137.7286525786), (-152, 137.7286525786), (-152, 155.7286525786), align=None)
        Polygon((202, 137.7286525786), (202, 146.7286525786), (202, 155.7286525786), (182, 155.7286525786), (182, 137.7286525786), align=None)
    extrude(amount=-F10_DEPTH, mode=Mode.SUBTRACT)


with BuildPart() as f12:
    # F11 (on Front) → F12 (new body)
    with BuildSketch(Plane.XZ):
        with BuildLine():
            Line((330.7051759626, -140.0111902357), (330.7051759626, -58.7111902357))
            Line((330.7051759626, -58.7111902357), (-118.2948240374, -58.7111902357))
            Line((-118.2948240374, -58.7111902357), (-118.2948240374, -140.0111902357))
            Line((-118.2948240374, -140.0111902357), (-78.2948240374, -140.0111902357))
            Line((-78.2948240374, -140.0111902357), (-78.2948240374, -108.7111902357))
            ThreePointArc((-78.2948240374, -108.7111902357), (-75.3658918492, -101.6401224238), (-68.2948240374, -98.7111902357))
            Line((-68.2948240374, -98.7111902357), (280.7051759626, -98.7111902357))
            ThreePointArc((280.7051759626, -98.7111902357), (287.7762437745, -101.6401224238), (290.7051759626, -108.7111902357))
            Line((290.7051759626, -108.7111902357), (290.7051759626, -140.0111902357))
            Line((290.7051759626, -140.0111902357), (330.7051759626, -140.0111902357))
        make_face()
    extrude(amount=F12_DEPTH)

    # F17
    with Locations(Plane(origin=(0, 0, -140.0111902357), x_dir=(1, 0, 0), z_dir=(0, 0, -1))):
        with Locations((-98.2948240374, 9)):
            Hole(F17_D / 2, depth=F17_DEPTH)
            with Locations((0, 0, -(F17_DEPTH + F17_TIP / 2))):  # 118° drill point
                Cone(0, F17_D / 2, F17_TIP, mode=Mode.SUBTRACT)

    # F17 on F15
    with Locations(Plane(origin=(-118.2948240374, 0, 0), x_dir=(0, -1, 0), z_dir=(-1, 0, 0))):
        with Locations((9, -78.7111902357)):
            Hole(F17_ON_F15_D / 2, depth=F17_ON_F15_DEPTH)
            with Locations((0, 0, -(F17_ON_F15_DEPTH + F17_ON_F15_TIP / 2))):  # 118° drill point
                Cone(0, F17_ON_F15_D / 2, F17_ON_F15_TIP, mode=Mode.SUBTRACT)

    # F17 on F16
    with Locations(Plane.YZ.offset(330.7051759626)):
        with Locations((-9, -78.7111902357)):
            Hole(F17_ON_F16_D / 2, depth=F17_ON_F16_DEPTH)
            with Locations((0, 0, -(F17_ON_F16_DEPTH + F17_ON_F16_TIP / 2))):  # 118° drill point
                Cone(0, F17_ON_F16_D / 2, F17_ON_F16_TIP, mode=Mode.SUBTRACT)

    # F17 on F14
    with Locations(Plane(origin=(0, 0, -140.0111902357), x_dir=(1, 0, 0), z_dir=(0, 0, -1))):
        with Locations((310.7051759626, 9)):
            Hole(F17_ON_F14_D / 2, depth=F17_ON_F14_DEPTH)
            with Locations((0, 0, -(F17_ON_F14_DEPTH + F17_ON_F14_TIP / 2))):  # 118° drill point
                Cone(0, F17_ON_F14_D / 2, F17_ON_F14_TIP, mode=Mode.SUBTRACT)


solid = Compound([f1_2.part, f12.part])
